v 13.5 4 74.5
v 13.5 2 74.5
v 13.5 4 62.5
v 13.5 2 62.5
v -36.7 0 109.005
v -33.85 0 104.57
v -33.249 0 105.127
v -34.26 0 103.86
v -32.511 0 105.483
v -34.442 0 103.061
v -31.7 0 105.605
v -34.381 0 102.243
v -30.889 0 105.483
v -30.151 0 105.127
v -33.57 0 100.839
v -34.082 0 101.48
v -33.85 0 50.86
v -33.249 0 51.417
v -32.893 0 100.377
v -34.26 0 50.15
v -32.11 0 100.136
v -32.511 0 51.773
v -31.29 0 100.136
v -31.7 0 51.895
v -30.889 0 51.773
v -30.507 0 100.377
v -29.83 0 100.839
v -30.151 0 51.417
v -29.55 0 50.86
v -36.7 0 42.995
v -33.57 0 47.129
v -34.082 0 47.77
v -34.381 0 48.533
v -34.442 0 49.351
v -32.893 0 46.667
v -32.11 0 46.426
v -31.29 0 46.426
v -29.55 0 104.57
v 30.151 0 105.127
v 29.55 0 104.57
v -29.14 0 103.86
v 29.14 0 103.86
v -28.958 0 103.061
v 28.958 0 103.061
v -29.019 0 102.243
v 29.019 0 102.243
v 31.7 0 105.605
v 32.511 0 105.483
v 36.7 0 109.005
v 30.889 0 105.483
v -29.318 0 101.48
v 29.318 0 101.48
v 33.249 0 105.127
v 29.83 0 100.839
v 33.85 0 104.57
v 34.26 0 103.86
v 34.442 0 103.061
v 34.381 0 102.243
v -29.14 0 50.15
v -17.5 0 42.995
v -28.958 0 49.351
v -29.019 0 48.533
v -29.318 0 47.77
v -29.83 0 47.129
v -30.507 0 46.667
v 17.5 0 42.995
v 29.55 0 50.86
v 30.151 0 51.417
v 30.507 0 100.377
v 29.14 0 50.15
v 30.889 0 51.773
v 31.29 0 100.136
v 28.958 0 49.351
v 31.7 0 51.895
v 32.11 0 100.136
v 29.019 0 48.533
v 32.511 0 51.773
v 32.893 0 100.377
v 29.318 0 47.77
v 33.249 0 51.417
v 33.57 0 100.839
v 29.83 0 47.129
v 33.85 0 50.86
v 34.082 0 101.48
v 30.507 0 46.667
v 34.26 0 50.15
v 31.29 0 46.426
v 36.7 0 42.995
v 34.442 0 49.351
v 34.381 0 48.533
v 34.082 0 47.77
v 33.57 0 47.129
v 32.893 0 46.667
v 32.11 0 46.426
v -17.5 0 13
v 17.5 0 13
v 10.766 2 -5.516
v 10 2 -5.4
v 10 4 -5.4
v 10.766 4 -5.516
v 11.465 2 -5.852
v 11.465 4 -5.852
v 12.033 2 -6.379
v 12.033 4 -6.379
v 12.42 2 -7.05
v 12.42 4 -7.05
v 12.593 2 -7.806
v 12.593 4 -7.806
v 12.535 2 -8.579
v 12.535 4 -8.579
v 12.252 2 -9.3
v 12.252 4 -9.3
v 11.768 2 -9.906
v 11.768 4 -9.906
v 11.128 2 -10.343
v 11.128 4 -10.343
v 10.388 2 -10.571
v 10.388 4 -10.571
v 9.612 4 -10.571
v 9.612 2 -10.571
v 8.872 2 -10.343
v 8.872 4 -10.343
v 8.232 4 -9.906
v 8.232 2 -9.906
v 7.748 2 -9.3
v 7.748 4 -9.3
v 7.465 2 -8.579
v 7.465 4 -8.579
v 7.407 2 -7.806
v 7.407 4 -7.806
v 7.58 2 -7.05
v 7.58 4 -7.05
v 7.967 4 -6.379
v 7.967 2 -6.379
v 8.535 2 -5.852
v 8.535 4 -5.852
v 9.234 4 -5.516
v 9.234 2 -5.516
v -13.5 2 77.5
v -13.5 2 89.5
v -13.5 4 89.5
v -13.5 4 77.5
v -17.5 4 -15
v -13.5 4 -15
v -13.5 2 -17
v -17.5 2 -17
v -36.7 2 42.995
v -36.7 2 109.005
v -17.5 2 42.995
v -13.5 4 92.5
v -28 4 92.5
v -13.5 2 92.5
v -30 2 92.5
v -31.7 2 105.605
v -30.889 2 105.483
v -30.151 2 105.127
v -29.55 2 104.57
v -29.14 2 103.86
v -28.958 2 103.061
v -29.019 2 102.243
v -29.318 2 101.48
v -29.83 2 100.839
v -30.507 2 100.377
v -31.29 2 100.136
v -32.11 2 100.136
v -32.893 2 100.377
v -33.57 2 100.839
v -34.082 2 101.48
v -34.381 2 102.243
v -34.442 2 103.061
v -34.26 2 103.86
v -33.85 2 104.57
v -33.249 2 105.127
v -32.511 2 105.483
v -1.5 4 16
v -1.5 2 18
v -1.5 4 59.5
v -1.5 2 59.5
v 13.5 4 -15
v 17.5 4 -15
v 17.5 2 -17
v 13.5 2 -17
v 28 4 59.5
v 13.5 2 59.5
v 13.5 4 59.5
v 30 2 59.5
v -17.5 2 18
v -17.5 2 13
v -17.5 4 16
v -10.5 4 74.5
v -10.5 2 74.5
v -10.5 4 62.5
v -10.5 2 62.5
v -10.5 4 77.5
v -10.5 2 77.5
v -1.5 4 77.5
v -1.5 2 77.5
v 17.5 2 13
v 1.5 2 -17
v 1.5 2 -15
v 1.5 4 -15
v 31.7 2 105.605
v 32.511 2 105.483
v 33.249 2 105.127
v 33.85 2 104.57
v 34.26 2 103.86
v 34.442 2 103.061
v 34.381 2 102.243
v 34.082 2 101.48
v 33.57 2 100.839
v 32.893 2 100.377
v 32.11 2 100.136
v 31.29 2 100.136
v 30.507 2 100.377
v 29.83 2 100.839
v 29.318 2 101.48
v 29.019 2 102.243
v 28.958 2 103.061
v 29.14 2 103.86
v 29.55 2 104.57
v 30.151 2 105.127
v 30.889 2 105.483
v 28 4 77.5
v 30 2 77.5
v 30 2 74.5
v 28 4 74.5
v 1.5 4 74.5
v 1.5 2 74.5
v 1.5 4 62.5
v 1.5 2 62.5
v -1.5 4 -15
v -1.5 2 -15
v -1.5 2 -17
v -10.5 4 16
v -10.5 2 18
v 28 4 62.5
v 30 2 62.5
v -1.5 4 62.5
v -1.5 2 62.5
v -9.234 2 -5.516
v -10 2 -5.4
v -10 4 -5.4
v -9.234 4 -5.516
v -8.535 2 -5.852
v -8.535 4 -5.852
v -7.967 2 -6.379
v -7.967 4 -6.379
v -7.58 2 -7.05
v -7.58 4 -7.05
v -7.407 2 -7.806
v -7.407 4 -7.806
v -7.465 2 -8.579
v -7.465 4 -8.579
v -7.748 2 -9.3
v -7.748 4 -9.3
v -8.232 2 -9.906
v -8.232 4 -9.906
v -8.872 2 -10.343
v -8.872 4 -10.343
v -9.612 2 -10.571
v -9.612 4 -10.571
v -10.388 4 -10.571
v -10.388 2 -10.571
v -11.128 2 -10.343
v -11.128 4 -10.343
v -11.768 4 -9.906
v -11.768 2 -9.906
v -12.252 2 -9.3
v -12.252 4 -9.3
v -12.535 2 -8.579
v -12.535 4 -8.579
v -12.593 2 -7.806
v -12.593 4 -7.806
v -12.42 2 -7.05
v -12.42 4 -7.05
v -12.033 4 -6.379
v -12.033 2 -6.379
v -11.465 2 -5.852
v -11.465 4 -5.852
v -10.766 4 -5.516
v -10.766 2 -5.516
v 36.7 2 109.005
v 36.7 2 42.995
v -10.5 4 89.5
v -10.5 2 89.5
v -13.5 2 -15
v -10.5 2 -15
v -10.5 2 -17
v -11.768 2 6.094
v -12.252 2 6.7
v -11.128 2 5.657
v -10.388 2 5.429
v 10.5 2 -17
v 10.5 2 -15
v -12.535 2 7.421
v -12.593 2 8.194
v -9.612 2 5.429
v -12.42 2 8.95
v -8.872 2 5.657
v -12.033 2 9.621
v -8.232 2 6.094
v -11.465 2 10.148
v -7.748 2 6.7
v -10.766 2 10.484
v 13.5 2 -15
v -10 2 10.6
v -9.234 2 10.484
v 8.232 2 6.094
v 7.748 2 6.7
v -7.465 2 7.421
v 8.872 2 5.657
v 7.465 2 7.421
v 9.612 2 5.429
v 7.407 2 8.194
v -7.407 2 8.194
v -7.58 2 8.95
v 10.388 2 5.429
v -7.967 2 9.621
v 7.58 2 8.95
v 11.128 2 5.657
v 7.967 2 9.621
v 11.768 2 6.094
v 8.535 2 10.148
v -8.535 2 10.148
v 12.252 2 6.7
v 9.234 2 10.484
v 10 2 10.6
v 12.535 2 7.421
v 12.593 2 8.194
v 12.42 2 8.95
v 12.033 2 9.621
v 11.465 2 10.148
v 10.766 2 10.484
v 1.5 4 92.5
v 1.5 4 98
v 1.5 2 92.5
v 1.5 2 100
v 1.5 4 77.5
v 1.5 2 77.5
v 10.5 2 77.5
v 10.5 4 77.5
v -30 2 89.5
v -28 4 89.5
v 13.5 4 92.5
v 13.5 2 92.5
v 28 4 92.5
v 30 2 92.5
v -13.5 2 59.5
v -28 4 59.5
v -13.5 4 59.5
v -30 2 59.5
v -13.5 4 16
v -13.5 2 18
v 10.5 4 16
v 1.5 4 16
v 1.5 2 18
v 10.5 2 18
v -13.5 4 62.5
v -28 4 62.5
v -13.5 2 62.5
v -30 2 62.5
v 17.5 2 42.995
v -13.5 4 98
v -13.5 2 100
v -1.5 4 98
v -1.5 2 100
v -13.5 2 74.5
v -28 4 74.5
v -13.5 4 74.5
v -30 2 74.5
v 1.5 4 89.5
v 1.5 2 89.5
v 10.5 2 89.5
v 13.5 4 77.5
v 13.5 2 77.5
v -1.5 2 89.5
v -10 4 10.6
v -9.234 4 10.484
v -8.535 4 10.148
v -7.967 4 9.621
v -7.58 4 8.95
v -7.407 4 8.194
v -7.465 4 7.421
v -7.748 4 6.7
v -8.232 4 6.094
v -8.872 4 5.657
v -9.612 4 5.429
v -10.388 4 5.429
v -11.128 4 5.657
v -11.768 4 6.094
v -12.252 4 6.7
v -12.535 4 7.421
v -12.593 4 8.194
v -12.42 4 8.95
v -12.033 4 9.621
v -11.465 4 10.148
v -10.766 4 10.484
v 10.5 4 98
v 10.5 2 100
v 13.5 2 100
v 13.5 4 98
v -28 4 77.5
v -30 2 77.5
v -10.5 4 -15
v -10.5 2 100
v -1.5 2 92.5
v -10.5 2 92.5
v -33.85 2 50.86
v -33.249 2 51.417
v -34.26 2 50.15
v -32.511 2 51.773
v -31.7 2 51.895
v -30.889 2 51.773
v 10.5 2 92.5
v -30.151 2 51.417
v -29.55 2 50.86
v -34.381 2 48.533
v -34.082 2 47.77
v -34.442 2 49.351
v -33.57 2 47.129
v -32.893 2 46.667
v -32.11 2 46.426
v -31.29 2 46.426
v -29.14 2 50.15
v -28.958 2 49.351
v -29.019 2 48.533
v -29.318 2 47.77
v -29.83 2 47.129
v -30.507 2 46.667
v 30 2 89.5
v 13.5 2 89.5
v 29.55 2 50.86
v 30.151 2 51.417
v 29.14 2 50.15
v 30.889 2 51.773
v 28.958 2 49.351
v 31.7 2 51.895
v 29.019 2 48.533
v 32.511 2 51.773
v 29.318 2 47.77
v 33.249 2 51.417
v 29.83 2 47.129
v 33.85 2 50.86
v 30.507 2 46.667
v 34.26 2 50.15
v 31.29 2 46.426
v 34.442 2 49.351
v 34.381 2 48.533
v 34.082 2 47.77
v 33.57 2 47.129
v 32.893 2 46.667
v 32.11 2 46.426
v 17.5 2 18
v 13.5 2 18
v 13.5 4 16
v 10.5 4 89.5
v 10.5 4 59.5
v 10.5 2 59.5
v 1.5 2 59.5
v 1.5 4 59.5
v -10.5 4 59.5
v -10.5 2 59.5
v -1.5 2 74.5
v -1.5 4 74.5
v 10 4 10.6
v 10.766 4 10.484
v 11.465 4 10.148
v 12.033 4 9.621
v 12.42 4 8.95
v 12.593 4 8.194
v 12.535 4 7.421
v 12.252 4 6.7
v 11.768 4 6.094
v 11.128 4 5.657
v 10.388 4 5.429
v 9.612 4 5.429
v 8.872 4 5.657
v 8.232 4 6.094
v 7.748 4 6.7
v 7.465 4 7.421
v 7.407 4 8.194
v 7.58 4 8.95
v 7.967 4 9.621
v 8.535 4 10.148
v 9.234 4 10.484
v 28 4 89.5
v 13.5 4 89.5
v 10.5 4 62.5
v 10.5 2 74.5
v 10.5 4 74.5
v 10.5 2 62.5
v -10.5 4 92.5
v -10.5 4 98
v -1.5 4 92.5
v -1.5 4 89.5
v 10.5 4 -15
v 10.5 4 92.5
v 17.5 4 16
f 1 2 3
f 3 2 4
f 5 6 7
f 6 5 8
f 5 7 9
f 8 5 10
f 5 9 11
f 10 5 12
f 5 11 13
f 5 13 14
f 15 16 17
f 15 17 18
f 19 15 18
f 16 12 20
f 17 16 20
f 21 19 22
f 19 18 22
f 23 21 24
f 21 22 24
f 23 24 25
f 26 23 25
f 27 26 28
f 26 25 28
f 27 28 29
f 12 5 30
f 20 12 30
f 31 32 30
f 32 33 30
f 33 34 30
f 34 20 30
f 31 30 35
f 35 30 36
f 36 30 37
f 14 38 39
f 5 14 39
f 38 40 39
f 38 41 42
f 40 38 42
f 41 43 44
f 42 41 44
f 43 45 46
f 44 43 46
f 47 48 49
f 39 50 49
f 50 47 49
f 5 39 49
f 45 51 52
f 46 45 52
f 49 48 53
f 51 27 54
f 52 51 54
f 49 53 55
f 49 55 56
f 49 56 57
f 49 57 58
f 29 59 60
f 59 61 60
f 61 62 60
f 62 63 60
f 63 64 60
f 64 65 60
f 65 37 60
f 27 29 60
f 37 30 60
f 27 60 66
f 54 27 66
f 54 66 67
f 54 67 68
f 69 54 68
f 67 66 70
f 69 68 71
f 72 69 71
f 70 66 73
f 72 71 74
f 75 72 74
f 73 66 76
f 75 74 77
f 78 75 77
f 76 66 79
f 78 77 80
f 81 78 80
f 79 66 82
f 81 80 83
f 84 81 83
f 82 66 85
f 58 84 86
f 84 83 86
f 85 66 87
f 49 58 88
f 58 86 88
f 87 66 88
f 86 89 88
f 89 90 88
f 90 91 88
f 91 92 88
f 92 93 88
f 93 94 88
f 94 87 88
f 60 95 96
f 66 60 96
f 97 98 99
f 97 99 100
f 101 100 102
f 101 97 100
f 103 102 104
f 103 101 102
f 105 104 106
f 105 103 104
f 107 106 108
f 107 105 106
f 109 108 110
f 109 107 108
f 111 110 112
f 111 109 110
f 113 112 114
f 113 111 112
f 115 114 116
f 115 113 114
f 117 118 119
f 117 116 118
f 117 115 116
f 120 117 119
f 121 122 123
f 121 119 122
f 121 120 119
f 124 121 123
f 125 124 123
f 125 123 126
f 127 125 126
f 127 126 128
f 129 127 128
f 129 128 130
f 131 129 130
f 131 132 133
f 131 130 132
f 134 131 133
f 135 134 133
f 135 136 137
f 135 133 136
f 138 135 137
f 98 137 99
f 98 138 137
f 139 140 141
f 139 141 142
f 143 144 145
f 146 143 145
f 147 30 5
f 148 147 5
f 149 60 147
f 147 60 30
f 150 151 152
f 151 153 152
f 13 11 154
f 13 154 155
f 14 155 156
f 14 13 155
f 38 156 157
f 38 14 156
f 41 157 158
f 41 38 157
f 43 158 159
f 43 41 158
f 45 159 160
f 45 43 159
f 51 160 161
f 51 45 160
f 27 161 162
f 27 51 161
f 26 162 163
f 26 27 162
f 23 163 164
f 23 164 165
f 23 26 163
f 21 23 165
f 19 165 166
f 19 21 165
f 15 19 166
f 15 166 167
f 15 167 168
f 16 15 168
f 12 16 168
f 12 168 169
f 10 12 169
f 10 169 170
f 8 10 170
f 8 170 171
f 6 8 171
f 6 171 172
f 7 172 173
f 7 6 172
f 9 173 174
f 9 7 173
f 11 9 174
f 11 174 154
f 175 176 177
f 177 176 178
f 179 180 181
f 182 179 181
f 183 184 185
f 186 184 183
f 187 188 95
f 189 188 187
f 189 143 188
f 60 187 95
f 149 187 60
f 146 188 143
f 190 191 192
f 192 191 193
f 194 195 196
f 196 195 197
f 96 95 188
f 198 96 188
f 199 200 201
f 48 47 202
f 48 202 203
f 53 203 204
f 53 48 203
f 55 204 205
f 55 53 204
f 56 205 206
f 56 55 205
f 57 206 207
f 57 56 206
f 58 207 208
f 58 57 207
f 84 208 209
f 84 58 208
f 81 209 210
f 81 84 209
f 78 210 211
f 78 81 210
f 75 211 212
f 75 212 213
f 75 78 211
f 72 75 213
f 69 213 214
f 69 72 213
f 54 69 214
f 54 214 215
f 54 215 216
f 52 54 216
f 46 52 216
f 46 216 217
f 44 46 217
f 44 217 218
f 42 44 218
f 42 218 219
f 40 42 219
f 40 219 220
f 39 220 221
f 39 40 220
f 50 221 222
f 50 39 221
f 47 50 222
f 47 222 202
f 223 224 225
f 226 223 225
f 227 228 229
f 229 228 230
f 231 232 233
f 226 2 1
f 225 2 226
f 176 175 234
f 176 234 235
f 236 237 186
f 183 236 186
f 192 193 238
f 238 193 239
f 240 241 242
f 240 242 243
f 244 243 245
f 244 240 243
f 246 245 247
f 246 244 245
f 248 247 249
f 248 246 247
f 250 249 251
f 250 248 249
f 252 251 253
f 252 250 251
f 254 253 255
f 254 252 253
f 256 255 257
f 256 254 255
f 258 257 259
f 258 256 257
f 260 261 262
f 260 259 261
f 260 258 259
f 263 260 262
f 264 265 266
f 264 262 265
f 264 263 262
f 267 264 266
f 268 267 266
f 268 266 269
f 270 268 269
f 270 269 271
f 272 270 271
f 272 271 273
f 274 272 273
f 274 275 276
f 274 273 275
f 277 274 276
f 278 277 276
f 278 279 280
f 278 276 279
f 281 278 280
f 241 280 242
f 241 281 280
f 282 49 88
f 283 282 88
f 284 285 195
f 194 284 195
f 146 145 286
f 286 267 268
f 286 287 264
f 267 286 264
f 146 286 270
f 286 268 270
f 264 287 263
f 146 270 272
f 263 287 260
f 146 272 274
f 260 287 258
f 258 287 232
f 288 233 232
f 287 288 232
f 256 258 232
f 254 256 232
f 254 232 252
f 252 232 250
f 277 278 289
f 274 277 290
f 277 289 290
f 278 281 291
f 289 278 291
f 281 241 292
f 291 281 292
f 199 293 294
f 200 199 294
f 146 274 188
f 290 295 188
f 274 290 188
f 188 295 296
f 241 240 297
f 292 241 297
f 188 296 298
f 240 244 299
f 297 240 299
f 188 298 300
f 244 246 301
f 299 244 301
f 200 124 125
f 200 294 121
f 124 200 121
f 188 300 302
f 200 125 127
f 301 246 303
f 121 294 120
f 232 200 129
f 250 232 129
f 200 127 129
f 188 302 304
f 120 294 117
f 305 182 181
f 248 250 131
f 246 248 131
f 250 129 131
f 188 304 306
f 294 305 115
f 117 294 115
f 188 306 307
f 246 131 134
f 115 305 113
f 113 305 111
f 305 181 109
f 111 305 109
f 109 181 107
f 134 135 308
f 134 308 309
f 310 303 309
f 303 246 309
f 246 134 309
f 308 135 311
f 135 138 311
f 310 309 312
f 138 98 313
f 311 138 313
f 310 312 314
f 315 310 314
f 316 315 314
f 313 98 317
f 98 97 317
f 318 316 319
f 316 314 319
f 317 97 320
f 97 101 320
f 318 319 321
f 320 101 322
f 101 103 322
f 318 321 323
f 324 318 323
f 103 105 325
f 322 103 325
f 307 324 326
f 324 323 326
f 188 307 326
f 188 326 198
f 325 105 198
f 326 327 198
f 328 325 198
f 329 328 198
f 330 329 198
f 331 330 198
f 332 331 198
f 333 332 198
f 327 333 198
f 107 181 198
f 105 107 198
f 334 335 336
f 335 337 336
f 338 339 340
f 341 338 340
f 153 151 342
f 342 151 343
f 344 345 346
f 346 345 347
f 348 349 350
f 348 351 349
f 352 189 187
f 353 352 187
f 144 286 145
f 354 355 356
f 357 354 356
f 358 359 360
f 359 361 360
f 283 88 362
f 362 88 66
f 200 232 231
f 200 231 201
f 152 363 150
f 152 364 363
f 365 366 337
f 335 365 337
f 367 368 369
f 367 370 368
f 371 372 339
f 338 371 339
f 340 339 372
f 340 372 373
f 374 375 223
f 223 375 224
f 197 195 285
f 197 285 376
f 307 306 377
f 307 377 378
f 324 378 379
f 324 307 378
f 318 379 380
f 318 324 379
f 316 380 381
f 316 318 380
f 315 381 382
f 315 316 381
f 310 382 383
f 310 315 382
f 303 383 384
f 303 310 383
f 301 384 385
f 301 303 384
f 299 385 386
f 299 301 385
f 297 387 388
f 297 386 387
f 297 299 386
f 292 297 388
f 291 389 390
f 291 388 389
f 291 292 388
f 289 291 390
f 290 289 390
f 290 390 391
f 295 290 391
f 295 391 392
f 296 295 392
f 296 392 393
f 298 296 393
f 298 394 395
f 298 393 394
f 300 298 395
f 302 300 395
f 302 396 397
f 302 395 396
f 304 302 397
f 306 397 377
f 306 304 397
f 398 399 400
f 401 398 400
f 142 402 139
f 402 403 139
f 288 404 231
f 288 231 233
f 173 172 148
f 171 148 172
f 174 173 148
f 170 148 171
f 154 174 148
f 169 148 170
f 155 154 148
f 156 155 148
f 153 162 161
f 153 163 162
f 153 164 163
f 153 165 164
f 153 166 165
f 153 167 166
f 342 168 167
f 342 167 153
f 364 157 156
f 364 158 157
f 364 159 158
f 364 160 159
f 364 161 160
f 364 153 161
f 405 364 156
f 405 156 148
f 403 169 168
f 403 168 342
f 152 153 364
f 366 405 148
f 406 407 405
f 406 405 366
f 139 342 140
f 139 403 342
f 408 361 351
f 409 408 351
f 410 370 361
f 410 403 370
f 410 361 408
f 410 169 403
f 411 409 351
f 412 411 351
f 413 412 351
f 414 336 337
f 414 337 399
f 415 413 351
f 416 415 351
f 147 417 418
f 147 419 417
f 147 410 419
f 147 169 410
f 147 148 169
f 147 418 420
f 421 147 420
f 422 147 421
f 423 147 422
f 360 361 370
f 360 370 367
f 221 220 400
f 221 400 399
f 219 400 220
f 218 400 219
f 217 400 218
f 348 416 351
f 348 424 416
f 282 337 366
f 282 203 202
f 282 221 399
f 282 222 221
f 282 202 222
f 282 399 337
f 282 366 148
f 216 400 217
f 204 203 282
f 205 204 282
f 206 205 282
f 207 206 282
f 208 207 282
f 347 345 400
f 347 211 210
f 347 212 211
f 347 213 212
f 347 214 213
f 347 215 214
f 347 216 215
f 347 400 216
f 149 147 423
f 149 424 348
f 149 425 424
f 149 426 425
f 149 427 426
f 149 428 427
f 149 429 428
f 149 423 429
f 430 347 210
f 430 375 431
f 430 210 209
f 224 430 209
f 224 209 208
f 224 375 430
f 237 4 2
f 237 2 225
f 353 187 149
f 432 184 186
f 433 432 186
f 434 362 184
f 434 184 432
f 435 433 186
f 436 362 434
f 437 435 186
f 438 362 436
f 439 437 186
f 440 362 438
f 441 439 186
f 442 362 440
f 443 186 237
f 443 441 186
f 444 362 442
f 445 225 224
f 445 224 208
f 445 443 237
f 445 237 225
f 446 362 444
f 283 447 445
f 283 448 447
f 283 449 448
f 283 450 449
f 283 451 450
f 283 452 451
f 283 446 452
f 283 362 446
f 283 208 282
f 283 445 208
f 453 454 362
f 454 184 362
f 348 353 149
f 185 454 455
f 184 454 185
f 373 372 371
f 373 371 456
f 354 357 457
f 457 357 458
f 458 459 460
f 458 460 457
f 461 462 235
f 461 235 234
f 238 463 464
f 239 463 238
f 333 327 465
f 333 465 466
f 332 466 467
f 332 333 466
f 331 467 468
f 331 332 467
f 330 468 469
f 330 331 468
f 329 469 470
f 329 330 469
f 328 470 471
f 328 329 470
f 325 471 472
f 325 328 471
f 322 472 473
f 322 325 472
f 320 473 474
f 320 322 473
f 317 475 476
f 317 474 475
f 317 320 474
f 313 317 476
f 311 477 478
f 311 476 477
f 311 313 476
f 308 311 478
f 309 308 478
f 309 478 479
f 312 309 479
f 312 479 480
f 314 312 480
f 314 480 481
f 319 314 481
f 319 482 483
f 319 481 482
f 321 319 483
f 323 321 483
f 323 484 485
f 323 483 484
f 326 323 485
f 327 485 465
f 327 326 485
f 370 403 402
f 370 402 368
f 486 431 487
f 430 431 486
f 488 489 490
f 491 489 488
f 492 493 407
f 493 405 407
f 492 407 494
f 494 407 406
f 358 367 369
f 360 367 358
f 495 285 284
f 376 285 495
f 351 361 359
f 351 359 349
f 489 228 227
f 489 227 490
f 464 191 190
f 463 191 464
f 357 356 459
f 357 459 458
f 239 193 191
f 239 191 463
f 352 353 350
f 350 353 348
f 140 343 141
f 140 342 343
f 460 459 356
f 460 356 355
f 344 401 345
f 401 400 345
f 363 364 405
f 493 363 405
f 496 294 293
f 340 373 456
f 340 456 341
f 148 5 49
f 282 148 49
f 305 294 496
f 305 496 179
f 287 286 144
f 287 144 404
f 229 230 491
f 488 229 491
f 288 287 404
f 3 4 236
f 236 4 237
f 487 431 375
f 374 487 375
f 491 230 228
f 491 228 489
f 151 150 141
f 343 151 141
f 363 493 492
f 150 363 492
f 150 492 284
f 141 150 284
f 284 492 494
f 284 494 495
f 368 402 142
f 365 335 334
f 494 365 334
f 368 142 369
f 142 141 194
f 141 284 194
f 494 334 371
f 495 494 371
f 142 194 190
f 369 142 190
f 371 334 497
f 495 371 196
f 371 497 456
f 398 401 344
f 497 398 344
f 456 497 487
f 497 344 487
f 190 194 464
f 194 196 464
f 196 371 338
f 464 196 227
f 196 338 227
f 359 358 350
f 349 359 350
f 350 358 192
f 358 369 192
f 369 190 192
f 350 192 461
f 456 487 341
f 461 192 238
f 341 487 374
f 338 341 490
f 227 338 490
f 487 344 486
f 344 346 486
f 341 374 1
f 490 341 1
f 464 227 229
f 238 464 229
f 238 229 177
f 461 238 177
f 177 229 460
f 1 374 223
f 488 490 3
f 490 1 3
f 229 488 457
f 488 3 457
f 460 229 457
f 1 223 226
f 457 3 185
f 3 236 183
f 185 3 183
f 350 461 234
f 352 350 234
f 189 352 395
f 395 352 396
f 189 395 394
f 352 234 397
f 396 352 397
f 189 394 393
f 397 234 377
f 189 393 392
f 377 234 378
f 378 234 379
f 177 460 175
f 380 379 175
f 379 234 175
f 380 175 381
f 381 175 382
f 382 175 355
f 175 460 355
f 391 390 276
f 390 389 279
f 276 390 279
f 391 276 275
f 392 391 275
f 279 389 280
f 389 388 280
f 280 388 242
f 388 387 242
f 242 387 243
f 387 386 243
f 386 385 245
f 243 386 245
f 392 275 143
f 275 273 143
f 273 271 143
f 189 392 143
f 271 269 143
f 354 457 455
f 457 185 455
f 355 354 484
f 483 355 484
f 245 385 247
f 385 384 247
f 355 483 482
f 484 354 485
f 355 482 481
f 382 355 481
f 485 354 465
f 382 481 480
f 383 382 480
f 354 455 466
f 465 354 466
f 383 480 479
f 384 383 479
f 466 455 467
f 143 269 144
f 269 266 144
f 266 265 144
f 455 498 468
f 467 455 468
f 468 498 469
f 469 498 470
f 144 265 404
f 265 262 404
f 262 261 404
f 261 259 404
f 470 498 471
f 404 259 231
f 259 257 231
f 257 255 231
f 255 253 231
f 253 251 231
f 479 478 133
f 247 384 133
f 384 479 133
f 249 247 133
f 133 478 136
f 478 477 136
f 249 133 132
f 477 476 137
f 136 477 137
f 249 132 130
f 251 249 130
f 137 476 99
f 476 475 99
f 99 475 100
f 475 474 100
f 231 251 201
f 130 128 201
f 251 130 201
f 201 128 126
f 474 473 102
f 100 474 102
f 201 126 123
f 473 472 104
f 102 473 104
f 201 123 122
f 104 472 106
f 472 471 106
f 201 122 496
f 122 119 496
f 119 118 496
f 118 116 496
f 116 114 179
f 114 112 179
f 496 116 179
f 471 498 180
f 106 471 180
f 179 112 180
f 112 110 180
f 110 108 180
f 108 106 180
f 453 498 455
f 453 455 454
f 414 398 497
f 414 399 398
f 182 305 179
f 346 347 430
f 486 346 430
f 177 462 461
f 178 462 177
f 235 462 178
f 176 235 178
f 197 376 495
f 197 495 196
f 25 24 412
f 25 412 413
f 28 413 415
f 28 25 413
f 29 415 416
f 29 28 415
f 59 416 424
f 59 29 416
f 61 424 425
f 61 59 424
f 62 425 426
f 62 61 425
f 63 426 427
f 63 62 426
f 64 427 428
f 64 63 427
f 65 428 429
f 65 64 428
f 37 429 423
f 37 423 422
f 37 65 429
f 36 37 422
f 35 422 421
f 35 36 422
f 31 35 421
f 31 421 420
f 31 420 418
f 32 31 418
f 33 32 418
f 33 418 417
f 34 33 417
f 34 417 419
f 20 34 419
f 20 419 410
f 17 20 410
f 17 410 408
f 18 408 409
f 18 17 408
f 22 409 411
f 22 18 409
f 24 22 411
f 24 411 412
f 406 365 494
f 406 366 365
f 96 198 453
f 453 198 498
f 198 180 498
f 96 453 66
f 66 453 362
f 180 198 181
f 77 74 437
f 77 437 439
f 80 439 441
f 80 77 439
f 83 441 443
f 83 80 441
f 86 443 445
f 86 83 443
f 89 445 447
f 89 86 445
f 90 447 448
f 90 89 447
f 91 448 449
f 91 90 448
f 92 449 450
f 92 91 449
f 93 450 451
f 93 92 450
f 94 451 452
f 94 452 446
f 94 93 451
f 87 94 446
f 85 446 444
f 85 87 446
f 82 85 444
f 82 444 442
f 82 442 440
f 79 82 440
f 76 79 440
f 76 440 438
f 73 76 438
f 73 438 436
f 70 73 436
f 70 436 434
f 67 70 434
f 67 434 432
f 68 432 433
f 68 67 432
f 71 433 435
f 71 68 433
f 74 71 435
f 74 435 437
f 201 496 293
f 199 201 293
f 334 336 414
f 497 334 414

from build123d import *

# Parameters (mm, degrees)
SKETCH1_R                = 2.75
BOSS_EXTRUDE1_DEPTH      = 2
SKETCH2_W                = 3
SKETCH2_H                = 100
BOSS_EXTRUDE2_DEPTH      = 2
SKETCH3_W                = 60
SKETCH3_H                = 3
BOSS_EXTRUDE3_DEPTH      = 2
CHAMFER1_SIZE            = 2
CHAMFER1_OF_MIRROR1_SIZE = 2
SKETCH5_W                = 35
SKETCH5_H                = 30
BOSS_EXTRUDE4_DEPTH      = 2
CHAMFER2_SIZE            = 3
CUT_EXTRUDE1_DEPTH       = 122.80201158
CUT_EXTRUDE1_DEPTH_BACK  = 122.80201158
CUT_EXTRUDE2_DEPTH       = 116.086836888
CUT_EXTRUDE2_DEPTH_BACK  = 116.086836888
SKETCH7_R                = 2.6
BOSS_EXTRUDE5_DEPTH      = 35
CUT_EXTRUDE3_DEPTH       = 116.086836888
CUT_EXTRUDE3_DEPTH_BACK  = 116.086836888
SKETCH9_W                = 3
SKETCH9_H                = 2


# Some blends are built 0.0001 mm under size
with BuildPart() as part:
    # Sketch1 → Boss-Extrude1 (new body)
    with BuildSketch(Plane(origin=(0, 0, 0), x_dir=(1, 0, 0), z_dir=(0, 1, 0))):
        Polygon((-17.5, 42.995), (-17.5, -42.995), (-36.7, -42.995), (-36.7, -109.005), (36.7, -109.005), (36.7, -42.995), (17.5, -42.995), (17.5, 42.995), (36.7, 42.995), (36.7, 109.005), (-36.7, 109.005), (-36.7, 42.995), align=None)
        with Locations(Location((-31.7, 102.855, 0), (0, 0, 270))):
            Circle(SKETCH1_R, mode=Mode.SUBTRACT)
        with Locations(Location((-31.7, 49.145, 0), (0, 0, 270))):
            Circle(SKETCH1_R, mode=Mode.SUBTRACT)
        with Locations(Location((31.7, 49.145, 0), (0, 0, 270))):
            Circle(SKETCH1_R, mode=Mode.SUBTRACT)
        with Locations(Location((31.7, 102.855, 0), (0, 0, 270))):
            Circle(SKETCH1_R, mode=Mode.SUBTRACT)
        with Locations(Location((31.7, -102.855, 0), (0, 0, 270))):
            Circle(SKETCH1_R, mode=Mode.SUBTRACT)
        with Locations(Location((31.7, -49.145, 0), (0, 0, 270))):
            Circle(SKETCH1_R, mode=Mode.SUBTRACT)
        with Locations(Location((-31.7, -49.145, 0), (0, 0, 270))):
            Circle(SKETCH1_R, mode=Mode.SUBTRACT)
        with Locations(Location((-31.7, -102.855, 0), (0, 0, 270))):
            Circle(SKETCH1_R, mode=Mode.SUBTRACT)
    extrude(amount=BOSS_EXTRUDE1_DEPTH)

    # Sketch2 → Boss-Extrude2 (add)
    with BuildSketch(Plane(origin=(0, 2, 0), x_dir=(1, 0, 0), z_dir=(0, 1, 0))):
        with Locations((12, -50)):
            Rectangle(SKETCH2_W, SKETCH2_H)
        with Locations((0, -50)):
            Rectangle(SKETCH2_W, SKETCH2_H)
        with Locations((-12, -50)):
            Rectangle(SKETCH2_W, SKETCH2_H)
    boss_extrude2 = extrude(amount=BOSS_EXTRUDE2_DEPTH)

    # Sketch3 → Boss-Extrude3 (add)
    with BuildSketch(Plane(origin=(0, 2, 0), x_dir=(1, 0, 0), z_dir=(0, 1, 0))):
        with Locations((0, -91)):
            Rectangle(SKETCH3_W, SKETCH3_H)
        with Locations((0, -61)):
            Rectangle(SKETCH3_W, SKETCH3_H)
        with Locations((0, -76)):
            Rectangle(SKETCH3_W, SKETCH3_H)
    boss_extrude3 = extrude(amount=BOSS_EXTRUDE3_DEPTH)

    # Chamfer1
    chamfer1_edges = [part.edges().sort_by_distance(p)[0] for p in [
        (30, 4, 61),
        (30, 4, 76),
        (30, 4, 91),
        (12, 4, 100),
        (0, 4, 100),
        (-12, 4, 100),
        (-30, 4, 91),
        (-30, 4, 76),
        (-30, 4, 61),
    ]]
    chamfer(chamfer1_edges, length=CHAMFER1_SIZE - 0.0001)  # a hair under: the kernel refuses the full size

    # Mirror1: Boss-Extrude2, Boss-Extrude3 across plane
    add(boss_extrude2.mirror(Plane.XY))
    add(boss_extrude3.mirror(Plane.XY))

    # Chamfer1 of Mirror1
    chamfer1_of_mirror1_edges = [part.edges().sort_by_distance(p)[0] for p in [
        (30, 4, -61),
        (30, 4, -76),
        (30, 4, -91),
        (12, 4, -100),
        (0, 4, -100),
        (-12, 4, -100),
        (-30, 4, -91),
        (-30, 4, -76),
        (-30, 4, -61),
    ]]
    chamfer(chamfer1_of_mirror1_edges, length=CHAMFER1_OF_MIRROR1_SIZE - 0.0001)  # a hair under: the kernel refuses the full size

    # Sketch5 → Boss-Extrude4 (add)
    with BuildSketch(Plane(origin=(0, 4, 0), x_dir=(1, 0, 0), z_dir=(0, 1, 0))):
        Rectangle(SKETCH5_W, SKETCH5_H)
    extrude(amount=-BOSS_EXTRUDE4_DEPTH)

    # Chamfer2
    # the kernel refuses this chamfer: 3 mm, written as the material it adds along each edge
    with BuildSketch(Plane(origin=(17.5, 2, 15), x_dir=(0, 0.9996219169112969, -0.027495876610586202), z_dir=(-1, 0, 0))) as chamfer2_piece_1_section:
        Polygon((CHAMFER2_SIZE * 0.999621916911, -CHAMFER2_SIZE * 0.0274958766106), (-CHAMFER2_SIZE * 0.0274958766106, -CHAMFER2_SIZE * 0.999621916911), (0, 0), align=None)
    chamfer2_piece_1 = extrude(amount=11.715048964, mode=Mode.PRIVATE)
    chamfer2_piece_1 = split(chamfer2_piece_1, bisect_by=Plane(origin=(15.5, 4, 16.092091005), z_dir=(0, -1, 0)), keep=Keep.TOP, mode=Mode.PRIVATE)
    add(chamfer2_piece_1)
    with BuildSketch(Plane(origin=(18.215048964, 2, 15), x_dir=(0, 0.9996219169112969, -0.027495876610586202), z_dir=(-1, 0, 0))) as chamfer2_piece_2_section:
        Polygon((CHAMFER2_SIZE * 0.999621916911, -CHAMFER2_SIZE * 0.0274958766106), (-CHAMFER2_SIZE * 0.0274958766106, -CHAMFER2_SIZE * 0.999621916911), (0, 0), align=None)
    chamfer2_piece_2 = extrude(amount=24.430097928, mode=Mode.PRIVATE)
    chamfer2_piece_2 = split(chamfer2_piece_2, bisect_by=Plane(origin=(14, 4, 16.092091005), z_dir=(0, -1, 0)), keep=Keep.TOP, mode=Mode.PRIVATE)
    chamfer2_piece_2 = split(chamfer2_piece_2, bisect_by=Plane(origin=(17.5, 2.79312586, 16.092091005), z_dir=(-1, 0, 0)), keep=Keep.TOP, mode=Mode.PRIVATE)
    add(chamfer2_piece_2)
    with BuildSketch(Plane(origin=(6.215048964, 2, 15), x_dir=(0, 0.9996219169112969, -0.027495876610586202), z_dir=(-1, 0, 0))) as chamfer2_piece_3_section:
        Polygon((CHAMFER2_SIZE * 0.999621916911, -CHAMFER2_SIZE * 0.0274958766106), (-CHAMFER2_SIZE * 0.0274958766106, -CHAMFER2_SIZE * 0.999621916911), (0, 0), align=None)
    chamfer2_piece_3 = extrude(amount=24.430097928, mode=Mode.PRIVATE)
    chamfer2_piece_3 = split(chamfer2_piece_3, bisect_by=Plane(origin=(2.357524482, 4, 16.092091005), z_dir=(0, -1, 0)), keep=Keep.TOP, mode=Mode.PRIVATE)
    chamfer2_piece_3 = split(chamfer2_piece_3, bisect_by=Plane(origin=(-17.5, 2.79312586, 16.092091005), z_dir=(1, 0, 0)), keep=Keep.TOP, mode=Mode.PRIVATE)
    add(chamfer2_piece_3)
    with BuildSketch(Plane(origin=(-5.784951036, 2, 15), x_dir=(0, 0.9996219169112969, -0.027495876610586202), z_dir=(-1, 0, 0))) as chamfer2_piece_4_section:
        Polygon((CHAMFER2_SIZE * 0.999621916911, -CHAMFER2_SIZE * 0.0274958766106), (-CHAMFER2_SIZE * 0.0274958766106, -CHAMFER2_SIZE * 0.999621916911), (0, 0), align=None)
    chamfer2_piece_4 = extrude(amount=11.715048964, mode=Mode.PRIVATE)
    chamfer2_piece_4 = split(chamfer2_piece_4, bisect_by=Plane(origin=(-9.642475518, 4, 16.092091005), z_dir=(0, -1, 0)), keep=Keep.TOP, mode=Mode.PRIVATE)
    add(chamfer2_piece_4)

    # Sketch6 → Cut-Extrude1 (cut, two sides: drawn at the far end of the back side and taken through both)
    with BuildSketch(Plane(origin=(17.5, 0, 0), x_dir=(0, 0, -1), z_dir=(1, 0, 0)).offset(-CUT_EXTRUDE1_DEPTH_BACK)):
        Polygon((-13, 0), (-13, 2), (15, 2), (15, 4), (109.005, 4), (109.005, 0), align=None)
    extrude(amount=CUT_EXTRUDE1_DEPTH + CUT_EXTRUDE1_DEPTH_BACK, mode=Mode.SUBTRACT)

    # Sketch7 → Cut-Extrude2 (cut, two sides: drawn at the far end of the back side and taken through both)
    with BuildSketch(Plane(origin=(0, 4, 0), x_dir=(1, 0, 0), z_dir=(0, 1, 0)).offset(-CUT_EXTRUDE2_DEPTH_BACK)):
        with Locations(Location((-10, -8, 0), (0, 0, 270))):
            Circle(SKETCH7_R)
        with Locations(Location((-10, 8, 0), (0, 0, 270))):
            Circle(SKETCH7_R)
        with Locations(Location((10, 8, 0), (0, 0, 270))):
            Circle(SKETCH7_R)
        with Locations(Location((10, -8, 0), (0, 0, 270))):
            Circle(SKETCH7_R)
    extrude(amount=CUT_EXTRUDE2_DEPTH + CUT_EXTRUDE2_DEPTH_BACK, mode=Mode.SUBTRACT)

    # Sketch8 → Boss-Extrude5 (add)
    with BuildSketch(Plane(origin=(17.5, 0, 0), x_dir=(0, 0, -1), z_dir=(1, 0, 0))):
        Polygon((15, 4), (17, 2), (15, 2), align=None)
    extrude(amount=-BOSS_EXTRUDE5_DEPTH)

    # Sketch9 → Cut-Extrude3 (cut, two sides: drawn at the far end of the back side and taken through both)
    with BuildSketch(Plane(origin=(0, 4, 0), x_dir=(1, 0, 0), z_dir=(0, 1, 0)).offset(-CUT_EXTRUDE3_DEPTH_BACK)):
        with Locations((-12, 16)):
            Rectangle(SKETCH9_W, SKETCH9_H)
        with Locations((0, 16)):
            Rectangle(SKETCH9_W, SKETCH9_H)
        with Locations((12, 16)):
            Rectangle(SKETCH9_W, SKETCH9_H)
    extrude(amount=CUT_EXTRUDE3_DEPTH + CUT_EXTRUDE3_DEPTH_BACK, mode=Mode.SUBTRACT)


solid = part.part
